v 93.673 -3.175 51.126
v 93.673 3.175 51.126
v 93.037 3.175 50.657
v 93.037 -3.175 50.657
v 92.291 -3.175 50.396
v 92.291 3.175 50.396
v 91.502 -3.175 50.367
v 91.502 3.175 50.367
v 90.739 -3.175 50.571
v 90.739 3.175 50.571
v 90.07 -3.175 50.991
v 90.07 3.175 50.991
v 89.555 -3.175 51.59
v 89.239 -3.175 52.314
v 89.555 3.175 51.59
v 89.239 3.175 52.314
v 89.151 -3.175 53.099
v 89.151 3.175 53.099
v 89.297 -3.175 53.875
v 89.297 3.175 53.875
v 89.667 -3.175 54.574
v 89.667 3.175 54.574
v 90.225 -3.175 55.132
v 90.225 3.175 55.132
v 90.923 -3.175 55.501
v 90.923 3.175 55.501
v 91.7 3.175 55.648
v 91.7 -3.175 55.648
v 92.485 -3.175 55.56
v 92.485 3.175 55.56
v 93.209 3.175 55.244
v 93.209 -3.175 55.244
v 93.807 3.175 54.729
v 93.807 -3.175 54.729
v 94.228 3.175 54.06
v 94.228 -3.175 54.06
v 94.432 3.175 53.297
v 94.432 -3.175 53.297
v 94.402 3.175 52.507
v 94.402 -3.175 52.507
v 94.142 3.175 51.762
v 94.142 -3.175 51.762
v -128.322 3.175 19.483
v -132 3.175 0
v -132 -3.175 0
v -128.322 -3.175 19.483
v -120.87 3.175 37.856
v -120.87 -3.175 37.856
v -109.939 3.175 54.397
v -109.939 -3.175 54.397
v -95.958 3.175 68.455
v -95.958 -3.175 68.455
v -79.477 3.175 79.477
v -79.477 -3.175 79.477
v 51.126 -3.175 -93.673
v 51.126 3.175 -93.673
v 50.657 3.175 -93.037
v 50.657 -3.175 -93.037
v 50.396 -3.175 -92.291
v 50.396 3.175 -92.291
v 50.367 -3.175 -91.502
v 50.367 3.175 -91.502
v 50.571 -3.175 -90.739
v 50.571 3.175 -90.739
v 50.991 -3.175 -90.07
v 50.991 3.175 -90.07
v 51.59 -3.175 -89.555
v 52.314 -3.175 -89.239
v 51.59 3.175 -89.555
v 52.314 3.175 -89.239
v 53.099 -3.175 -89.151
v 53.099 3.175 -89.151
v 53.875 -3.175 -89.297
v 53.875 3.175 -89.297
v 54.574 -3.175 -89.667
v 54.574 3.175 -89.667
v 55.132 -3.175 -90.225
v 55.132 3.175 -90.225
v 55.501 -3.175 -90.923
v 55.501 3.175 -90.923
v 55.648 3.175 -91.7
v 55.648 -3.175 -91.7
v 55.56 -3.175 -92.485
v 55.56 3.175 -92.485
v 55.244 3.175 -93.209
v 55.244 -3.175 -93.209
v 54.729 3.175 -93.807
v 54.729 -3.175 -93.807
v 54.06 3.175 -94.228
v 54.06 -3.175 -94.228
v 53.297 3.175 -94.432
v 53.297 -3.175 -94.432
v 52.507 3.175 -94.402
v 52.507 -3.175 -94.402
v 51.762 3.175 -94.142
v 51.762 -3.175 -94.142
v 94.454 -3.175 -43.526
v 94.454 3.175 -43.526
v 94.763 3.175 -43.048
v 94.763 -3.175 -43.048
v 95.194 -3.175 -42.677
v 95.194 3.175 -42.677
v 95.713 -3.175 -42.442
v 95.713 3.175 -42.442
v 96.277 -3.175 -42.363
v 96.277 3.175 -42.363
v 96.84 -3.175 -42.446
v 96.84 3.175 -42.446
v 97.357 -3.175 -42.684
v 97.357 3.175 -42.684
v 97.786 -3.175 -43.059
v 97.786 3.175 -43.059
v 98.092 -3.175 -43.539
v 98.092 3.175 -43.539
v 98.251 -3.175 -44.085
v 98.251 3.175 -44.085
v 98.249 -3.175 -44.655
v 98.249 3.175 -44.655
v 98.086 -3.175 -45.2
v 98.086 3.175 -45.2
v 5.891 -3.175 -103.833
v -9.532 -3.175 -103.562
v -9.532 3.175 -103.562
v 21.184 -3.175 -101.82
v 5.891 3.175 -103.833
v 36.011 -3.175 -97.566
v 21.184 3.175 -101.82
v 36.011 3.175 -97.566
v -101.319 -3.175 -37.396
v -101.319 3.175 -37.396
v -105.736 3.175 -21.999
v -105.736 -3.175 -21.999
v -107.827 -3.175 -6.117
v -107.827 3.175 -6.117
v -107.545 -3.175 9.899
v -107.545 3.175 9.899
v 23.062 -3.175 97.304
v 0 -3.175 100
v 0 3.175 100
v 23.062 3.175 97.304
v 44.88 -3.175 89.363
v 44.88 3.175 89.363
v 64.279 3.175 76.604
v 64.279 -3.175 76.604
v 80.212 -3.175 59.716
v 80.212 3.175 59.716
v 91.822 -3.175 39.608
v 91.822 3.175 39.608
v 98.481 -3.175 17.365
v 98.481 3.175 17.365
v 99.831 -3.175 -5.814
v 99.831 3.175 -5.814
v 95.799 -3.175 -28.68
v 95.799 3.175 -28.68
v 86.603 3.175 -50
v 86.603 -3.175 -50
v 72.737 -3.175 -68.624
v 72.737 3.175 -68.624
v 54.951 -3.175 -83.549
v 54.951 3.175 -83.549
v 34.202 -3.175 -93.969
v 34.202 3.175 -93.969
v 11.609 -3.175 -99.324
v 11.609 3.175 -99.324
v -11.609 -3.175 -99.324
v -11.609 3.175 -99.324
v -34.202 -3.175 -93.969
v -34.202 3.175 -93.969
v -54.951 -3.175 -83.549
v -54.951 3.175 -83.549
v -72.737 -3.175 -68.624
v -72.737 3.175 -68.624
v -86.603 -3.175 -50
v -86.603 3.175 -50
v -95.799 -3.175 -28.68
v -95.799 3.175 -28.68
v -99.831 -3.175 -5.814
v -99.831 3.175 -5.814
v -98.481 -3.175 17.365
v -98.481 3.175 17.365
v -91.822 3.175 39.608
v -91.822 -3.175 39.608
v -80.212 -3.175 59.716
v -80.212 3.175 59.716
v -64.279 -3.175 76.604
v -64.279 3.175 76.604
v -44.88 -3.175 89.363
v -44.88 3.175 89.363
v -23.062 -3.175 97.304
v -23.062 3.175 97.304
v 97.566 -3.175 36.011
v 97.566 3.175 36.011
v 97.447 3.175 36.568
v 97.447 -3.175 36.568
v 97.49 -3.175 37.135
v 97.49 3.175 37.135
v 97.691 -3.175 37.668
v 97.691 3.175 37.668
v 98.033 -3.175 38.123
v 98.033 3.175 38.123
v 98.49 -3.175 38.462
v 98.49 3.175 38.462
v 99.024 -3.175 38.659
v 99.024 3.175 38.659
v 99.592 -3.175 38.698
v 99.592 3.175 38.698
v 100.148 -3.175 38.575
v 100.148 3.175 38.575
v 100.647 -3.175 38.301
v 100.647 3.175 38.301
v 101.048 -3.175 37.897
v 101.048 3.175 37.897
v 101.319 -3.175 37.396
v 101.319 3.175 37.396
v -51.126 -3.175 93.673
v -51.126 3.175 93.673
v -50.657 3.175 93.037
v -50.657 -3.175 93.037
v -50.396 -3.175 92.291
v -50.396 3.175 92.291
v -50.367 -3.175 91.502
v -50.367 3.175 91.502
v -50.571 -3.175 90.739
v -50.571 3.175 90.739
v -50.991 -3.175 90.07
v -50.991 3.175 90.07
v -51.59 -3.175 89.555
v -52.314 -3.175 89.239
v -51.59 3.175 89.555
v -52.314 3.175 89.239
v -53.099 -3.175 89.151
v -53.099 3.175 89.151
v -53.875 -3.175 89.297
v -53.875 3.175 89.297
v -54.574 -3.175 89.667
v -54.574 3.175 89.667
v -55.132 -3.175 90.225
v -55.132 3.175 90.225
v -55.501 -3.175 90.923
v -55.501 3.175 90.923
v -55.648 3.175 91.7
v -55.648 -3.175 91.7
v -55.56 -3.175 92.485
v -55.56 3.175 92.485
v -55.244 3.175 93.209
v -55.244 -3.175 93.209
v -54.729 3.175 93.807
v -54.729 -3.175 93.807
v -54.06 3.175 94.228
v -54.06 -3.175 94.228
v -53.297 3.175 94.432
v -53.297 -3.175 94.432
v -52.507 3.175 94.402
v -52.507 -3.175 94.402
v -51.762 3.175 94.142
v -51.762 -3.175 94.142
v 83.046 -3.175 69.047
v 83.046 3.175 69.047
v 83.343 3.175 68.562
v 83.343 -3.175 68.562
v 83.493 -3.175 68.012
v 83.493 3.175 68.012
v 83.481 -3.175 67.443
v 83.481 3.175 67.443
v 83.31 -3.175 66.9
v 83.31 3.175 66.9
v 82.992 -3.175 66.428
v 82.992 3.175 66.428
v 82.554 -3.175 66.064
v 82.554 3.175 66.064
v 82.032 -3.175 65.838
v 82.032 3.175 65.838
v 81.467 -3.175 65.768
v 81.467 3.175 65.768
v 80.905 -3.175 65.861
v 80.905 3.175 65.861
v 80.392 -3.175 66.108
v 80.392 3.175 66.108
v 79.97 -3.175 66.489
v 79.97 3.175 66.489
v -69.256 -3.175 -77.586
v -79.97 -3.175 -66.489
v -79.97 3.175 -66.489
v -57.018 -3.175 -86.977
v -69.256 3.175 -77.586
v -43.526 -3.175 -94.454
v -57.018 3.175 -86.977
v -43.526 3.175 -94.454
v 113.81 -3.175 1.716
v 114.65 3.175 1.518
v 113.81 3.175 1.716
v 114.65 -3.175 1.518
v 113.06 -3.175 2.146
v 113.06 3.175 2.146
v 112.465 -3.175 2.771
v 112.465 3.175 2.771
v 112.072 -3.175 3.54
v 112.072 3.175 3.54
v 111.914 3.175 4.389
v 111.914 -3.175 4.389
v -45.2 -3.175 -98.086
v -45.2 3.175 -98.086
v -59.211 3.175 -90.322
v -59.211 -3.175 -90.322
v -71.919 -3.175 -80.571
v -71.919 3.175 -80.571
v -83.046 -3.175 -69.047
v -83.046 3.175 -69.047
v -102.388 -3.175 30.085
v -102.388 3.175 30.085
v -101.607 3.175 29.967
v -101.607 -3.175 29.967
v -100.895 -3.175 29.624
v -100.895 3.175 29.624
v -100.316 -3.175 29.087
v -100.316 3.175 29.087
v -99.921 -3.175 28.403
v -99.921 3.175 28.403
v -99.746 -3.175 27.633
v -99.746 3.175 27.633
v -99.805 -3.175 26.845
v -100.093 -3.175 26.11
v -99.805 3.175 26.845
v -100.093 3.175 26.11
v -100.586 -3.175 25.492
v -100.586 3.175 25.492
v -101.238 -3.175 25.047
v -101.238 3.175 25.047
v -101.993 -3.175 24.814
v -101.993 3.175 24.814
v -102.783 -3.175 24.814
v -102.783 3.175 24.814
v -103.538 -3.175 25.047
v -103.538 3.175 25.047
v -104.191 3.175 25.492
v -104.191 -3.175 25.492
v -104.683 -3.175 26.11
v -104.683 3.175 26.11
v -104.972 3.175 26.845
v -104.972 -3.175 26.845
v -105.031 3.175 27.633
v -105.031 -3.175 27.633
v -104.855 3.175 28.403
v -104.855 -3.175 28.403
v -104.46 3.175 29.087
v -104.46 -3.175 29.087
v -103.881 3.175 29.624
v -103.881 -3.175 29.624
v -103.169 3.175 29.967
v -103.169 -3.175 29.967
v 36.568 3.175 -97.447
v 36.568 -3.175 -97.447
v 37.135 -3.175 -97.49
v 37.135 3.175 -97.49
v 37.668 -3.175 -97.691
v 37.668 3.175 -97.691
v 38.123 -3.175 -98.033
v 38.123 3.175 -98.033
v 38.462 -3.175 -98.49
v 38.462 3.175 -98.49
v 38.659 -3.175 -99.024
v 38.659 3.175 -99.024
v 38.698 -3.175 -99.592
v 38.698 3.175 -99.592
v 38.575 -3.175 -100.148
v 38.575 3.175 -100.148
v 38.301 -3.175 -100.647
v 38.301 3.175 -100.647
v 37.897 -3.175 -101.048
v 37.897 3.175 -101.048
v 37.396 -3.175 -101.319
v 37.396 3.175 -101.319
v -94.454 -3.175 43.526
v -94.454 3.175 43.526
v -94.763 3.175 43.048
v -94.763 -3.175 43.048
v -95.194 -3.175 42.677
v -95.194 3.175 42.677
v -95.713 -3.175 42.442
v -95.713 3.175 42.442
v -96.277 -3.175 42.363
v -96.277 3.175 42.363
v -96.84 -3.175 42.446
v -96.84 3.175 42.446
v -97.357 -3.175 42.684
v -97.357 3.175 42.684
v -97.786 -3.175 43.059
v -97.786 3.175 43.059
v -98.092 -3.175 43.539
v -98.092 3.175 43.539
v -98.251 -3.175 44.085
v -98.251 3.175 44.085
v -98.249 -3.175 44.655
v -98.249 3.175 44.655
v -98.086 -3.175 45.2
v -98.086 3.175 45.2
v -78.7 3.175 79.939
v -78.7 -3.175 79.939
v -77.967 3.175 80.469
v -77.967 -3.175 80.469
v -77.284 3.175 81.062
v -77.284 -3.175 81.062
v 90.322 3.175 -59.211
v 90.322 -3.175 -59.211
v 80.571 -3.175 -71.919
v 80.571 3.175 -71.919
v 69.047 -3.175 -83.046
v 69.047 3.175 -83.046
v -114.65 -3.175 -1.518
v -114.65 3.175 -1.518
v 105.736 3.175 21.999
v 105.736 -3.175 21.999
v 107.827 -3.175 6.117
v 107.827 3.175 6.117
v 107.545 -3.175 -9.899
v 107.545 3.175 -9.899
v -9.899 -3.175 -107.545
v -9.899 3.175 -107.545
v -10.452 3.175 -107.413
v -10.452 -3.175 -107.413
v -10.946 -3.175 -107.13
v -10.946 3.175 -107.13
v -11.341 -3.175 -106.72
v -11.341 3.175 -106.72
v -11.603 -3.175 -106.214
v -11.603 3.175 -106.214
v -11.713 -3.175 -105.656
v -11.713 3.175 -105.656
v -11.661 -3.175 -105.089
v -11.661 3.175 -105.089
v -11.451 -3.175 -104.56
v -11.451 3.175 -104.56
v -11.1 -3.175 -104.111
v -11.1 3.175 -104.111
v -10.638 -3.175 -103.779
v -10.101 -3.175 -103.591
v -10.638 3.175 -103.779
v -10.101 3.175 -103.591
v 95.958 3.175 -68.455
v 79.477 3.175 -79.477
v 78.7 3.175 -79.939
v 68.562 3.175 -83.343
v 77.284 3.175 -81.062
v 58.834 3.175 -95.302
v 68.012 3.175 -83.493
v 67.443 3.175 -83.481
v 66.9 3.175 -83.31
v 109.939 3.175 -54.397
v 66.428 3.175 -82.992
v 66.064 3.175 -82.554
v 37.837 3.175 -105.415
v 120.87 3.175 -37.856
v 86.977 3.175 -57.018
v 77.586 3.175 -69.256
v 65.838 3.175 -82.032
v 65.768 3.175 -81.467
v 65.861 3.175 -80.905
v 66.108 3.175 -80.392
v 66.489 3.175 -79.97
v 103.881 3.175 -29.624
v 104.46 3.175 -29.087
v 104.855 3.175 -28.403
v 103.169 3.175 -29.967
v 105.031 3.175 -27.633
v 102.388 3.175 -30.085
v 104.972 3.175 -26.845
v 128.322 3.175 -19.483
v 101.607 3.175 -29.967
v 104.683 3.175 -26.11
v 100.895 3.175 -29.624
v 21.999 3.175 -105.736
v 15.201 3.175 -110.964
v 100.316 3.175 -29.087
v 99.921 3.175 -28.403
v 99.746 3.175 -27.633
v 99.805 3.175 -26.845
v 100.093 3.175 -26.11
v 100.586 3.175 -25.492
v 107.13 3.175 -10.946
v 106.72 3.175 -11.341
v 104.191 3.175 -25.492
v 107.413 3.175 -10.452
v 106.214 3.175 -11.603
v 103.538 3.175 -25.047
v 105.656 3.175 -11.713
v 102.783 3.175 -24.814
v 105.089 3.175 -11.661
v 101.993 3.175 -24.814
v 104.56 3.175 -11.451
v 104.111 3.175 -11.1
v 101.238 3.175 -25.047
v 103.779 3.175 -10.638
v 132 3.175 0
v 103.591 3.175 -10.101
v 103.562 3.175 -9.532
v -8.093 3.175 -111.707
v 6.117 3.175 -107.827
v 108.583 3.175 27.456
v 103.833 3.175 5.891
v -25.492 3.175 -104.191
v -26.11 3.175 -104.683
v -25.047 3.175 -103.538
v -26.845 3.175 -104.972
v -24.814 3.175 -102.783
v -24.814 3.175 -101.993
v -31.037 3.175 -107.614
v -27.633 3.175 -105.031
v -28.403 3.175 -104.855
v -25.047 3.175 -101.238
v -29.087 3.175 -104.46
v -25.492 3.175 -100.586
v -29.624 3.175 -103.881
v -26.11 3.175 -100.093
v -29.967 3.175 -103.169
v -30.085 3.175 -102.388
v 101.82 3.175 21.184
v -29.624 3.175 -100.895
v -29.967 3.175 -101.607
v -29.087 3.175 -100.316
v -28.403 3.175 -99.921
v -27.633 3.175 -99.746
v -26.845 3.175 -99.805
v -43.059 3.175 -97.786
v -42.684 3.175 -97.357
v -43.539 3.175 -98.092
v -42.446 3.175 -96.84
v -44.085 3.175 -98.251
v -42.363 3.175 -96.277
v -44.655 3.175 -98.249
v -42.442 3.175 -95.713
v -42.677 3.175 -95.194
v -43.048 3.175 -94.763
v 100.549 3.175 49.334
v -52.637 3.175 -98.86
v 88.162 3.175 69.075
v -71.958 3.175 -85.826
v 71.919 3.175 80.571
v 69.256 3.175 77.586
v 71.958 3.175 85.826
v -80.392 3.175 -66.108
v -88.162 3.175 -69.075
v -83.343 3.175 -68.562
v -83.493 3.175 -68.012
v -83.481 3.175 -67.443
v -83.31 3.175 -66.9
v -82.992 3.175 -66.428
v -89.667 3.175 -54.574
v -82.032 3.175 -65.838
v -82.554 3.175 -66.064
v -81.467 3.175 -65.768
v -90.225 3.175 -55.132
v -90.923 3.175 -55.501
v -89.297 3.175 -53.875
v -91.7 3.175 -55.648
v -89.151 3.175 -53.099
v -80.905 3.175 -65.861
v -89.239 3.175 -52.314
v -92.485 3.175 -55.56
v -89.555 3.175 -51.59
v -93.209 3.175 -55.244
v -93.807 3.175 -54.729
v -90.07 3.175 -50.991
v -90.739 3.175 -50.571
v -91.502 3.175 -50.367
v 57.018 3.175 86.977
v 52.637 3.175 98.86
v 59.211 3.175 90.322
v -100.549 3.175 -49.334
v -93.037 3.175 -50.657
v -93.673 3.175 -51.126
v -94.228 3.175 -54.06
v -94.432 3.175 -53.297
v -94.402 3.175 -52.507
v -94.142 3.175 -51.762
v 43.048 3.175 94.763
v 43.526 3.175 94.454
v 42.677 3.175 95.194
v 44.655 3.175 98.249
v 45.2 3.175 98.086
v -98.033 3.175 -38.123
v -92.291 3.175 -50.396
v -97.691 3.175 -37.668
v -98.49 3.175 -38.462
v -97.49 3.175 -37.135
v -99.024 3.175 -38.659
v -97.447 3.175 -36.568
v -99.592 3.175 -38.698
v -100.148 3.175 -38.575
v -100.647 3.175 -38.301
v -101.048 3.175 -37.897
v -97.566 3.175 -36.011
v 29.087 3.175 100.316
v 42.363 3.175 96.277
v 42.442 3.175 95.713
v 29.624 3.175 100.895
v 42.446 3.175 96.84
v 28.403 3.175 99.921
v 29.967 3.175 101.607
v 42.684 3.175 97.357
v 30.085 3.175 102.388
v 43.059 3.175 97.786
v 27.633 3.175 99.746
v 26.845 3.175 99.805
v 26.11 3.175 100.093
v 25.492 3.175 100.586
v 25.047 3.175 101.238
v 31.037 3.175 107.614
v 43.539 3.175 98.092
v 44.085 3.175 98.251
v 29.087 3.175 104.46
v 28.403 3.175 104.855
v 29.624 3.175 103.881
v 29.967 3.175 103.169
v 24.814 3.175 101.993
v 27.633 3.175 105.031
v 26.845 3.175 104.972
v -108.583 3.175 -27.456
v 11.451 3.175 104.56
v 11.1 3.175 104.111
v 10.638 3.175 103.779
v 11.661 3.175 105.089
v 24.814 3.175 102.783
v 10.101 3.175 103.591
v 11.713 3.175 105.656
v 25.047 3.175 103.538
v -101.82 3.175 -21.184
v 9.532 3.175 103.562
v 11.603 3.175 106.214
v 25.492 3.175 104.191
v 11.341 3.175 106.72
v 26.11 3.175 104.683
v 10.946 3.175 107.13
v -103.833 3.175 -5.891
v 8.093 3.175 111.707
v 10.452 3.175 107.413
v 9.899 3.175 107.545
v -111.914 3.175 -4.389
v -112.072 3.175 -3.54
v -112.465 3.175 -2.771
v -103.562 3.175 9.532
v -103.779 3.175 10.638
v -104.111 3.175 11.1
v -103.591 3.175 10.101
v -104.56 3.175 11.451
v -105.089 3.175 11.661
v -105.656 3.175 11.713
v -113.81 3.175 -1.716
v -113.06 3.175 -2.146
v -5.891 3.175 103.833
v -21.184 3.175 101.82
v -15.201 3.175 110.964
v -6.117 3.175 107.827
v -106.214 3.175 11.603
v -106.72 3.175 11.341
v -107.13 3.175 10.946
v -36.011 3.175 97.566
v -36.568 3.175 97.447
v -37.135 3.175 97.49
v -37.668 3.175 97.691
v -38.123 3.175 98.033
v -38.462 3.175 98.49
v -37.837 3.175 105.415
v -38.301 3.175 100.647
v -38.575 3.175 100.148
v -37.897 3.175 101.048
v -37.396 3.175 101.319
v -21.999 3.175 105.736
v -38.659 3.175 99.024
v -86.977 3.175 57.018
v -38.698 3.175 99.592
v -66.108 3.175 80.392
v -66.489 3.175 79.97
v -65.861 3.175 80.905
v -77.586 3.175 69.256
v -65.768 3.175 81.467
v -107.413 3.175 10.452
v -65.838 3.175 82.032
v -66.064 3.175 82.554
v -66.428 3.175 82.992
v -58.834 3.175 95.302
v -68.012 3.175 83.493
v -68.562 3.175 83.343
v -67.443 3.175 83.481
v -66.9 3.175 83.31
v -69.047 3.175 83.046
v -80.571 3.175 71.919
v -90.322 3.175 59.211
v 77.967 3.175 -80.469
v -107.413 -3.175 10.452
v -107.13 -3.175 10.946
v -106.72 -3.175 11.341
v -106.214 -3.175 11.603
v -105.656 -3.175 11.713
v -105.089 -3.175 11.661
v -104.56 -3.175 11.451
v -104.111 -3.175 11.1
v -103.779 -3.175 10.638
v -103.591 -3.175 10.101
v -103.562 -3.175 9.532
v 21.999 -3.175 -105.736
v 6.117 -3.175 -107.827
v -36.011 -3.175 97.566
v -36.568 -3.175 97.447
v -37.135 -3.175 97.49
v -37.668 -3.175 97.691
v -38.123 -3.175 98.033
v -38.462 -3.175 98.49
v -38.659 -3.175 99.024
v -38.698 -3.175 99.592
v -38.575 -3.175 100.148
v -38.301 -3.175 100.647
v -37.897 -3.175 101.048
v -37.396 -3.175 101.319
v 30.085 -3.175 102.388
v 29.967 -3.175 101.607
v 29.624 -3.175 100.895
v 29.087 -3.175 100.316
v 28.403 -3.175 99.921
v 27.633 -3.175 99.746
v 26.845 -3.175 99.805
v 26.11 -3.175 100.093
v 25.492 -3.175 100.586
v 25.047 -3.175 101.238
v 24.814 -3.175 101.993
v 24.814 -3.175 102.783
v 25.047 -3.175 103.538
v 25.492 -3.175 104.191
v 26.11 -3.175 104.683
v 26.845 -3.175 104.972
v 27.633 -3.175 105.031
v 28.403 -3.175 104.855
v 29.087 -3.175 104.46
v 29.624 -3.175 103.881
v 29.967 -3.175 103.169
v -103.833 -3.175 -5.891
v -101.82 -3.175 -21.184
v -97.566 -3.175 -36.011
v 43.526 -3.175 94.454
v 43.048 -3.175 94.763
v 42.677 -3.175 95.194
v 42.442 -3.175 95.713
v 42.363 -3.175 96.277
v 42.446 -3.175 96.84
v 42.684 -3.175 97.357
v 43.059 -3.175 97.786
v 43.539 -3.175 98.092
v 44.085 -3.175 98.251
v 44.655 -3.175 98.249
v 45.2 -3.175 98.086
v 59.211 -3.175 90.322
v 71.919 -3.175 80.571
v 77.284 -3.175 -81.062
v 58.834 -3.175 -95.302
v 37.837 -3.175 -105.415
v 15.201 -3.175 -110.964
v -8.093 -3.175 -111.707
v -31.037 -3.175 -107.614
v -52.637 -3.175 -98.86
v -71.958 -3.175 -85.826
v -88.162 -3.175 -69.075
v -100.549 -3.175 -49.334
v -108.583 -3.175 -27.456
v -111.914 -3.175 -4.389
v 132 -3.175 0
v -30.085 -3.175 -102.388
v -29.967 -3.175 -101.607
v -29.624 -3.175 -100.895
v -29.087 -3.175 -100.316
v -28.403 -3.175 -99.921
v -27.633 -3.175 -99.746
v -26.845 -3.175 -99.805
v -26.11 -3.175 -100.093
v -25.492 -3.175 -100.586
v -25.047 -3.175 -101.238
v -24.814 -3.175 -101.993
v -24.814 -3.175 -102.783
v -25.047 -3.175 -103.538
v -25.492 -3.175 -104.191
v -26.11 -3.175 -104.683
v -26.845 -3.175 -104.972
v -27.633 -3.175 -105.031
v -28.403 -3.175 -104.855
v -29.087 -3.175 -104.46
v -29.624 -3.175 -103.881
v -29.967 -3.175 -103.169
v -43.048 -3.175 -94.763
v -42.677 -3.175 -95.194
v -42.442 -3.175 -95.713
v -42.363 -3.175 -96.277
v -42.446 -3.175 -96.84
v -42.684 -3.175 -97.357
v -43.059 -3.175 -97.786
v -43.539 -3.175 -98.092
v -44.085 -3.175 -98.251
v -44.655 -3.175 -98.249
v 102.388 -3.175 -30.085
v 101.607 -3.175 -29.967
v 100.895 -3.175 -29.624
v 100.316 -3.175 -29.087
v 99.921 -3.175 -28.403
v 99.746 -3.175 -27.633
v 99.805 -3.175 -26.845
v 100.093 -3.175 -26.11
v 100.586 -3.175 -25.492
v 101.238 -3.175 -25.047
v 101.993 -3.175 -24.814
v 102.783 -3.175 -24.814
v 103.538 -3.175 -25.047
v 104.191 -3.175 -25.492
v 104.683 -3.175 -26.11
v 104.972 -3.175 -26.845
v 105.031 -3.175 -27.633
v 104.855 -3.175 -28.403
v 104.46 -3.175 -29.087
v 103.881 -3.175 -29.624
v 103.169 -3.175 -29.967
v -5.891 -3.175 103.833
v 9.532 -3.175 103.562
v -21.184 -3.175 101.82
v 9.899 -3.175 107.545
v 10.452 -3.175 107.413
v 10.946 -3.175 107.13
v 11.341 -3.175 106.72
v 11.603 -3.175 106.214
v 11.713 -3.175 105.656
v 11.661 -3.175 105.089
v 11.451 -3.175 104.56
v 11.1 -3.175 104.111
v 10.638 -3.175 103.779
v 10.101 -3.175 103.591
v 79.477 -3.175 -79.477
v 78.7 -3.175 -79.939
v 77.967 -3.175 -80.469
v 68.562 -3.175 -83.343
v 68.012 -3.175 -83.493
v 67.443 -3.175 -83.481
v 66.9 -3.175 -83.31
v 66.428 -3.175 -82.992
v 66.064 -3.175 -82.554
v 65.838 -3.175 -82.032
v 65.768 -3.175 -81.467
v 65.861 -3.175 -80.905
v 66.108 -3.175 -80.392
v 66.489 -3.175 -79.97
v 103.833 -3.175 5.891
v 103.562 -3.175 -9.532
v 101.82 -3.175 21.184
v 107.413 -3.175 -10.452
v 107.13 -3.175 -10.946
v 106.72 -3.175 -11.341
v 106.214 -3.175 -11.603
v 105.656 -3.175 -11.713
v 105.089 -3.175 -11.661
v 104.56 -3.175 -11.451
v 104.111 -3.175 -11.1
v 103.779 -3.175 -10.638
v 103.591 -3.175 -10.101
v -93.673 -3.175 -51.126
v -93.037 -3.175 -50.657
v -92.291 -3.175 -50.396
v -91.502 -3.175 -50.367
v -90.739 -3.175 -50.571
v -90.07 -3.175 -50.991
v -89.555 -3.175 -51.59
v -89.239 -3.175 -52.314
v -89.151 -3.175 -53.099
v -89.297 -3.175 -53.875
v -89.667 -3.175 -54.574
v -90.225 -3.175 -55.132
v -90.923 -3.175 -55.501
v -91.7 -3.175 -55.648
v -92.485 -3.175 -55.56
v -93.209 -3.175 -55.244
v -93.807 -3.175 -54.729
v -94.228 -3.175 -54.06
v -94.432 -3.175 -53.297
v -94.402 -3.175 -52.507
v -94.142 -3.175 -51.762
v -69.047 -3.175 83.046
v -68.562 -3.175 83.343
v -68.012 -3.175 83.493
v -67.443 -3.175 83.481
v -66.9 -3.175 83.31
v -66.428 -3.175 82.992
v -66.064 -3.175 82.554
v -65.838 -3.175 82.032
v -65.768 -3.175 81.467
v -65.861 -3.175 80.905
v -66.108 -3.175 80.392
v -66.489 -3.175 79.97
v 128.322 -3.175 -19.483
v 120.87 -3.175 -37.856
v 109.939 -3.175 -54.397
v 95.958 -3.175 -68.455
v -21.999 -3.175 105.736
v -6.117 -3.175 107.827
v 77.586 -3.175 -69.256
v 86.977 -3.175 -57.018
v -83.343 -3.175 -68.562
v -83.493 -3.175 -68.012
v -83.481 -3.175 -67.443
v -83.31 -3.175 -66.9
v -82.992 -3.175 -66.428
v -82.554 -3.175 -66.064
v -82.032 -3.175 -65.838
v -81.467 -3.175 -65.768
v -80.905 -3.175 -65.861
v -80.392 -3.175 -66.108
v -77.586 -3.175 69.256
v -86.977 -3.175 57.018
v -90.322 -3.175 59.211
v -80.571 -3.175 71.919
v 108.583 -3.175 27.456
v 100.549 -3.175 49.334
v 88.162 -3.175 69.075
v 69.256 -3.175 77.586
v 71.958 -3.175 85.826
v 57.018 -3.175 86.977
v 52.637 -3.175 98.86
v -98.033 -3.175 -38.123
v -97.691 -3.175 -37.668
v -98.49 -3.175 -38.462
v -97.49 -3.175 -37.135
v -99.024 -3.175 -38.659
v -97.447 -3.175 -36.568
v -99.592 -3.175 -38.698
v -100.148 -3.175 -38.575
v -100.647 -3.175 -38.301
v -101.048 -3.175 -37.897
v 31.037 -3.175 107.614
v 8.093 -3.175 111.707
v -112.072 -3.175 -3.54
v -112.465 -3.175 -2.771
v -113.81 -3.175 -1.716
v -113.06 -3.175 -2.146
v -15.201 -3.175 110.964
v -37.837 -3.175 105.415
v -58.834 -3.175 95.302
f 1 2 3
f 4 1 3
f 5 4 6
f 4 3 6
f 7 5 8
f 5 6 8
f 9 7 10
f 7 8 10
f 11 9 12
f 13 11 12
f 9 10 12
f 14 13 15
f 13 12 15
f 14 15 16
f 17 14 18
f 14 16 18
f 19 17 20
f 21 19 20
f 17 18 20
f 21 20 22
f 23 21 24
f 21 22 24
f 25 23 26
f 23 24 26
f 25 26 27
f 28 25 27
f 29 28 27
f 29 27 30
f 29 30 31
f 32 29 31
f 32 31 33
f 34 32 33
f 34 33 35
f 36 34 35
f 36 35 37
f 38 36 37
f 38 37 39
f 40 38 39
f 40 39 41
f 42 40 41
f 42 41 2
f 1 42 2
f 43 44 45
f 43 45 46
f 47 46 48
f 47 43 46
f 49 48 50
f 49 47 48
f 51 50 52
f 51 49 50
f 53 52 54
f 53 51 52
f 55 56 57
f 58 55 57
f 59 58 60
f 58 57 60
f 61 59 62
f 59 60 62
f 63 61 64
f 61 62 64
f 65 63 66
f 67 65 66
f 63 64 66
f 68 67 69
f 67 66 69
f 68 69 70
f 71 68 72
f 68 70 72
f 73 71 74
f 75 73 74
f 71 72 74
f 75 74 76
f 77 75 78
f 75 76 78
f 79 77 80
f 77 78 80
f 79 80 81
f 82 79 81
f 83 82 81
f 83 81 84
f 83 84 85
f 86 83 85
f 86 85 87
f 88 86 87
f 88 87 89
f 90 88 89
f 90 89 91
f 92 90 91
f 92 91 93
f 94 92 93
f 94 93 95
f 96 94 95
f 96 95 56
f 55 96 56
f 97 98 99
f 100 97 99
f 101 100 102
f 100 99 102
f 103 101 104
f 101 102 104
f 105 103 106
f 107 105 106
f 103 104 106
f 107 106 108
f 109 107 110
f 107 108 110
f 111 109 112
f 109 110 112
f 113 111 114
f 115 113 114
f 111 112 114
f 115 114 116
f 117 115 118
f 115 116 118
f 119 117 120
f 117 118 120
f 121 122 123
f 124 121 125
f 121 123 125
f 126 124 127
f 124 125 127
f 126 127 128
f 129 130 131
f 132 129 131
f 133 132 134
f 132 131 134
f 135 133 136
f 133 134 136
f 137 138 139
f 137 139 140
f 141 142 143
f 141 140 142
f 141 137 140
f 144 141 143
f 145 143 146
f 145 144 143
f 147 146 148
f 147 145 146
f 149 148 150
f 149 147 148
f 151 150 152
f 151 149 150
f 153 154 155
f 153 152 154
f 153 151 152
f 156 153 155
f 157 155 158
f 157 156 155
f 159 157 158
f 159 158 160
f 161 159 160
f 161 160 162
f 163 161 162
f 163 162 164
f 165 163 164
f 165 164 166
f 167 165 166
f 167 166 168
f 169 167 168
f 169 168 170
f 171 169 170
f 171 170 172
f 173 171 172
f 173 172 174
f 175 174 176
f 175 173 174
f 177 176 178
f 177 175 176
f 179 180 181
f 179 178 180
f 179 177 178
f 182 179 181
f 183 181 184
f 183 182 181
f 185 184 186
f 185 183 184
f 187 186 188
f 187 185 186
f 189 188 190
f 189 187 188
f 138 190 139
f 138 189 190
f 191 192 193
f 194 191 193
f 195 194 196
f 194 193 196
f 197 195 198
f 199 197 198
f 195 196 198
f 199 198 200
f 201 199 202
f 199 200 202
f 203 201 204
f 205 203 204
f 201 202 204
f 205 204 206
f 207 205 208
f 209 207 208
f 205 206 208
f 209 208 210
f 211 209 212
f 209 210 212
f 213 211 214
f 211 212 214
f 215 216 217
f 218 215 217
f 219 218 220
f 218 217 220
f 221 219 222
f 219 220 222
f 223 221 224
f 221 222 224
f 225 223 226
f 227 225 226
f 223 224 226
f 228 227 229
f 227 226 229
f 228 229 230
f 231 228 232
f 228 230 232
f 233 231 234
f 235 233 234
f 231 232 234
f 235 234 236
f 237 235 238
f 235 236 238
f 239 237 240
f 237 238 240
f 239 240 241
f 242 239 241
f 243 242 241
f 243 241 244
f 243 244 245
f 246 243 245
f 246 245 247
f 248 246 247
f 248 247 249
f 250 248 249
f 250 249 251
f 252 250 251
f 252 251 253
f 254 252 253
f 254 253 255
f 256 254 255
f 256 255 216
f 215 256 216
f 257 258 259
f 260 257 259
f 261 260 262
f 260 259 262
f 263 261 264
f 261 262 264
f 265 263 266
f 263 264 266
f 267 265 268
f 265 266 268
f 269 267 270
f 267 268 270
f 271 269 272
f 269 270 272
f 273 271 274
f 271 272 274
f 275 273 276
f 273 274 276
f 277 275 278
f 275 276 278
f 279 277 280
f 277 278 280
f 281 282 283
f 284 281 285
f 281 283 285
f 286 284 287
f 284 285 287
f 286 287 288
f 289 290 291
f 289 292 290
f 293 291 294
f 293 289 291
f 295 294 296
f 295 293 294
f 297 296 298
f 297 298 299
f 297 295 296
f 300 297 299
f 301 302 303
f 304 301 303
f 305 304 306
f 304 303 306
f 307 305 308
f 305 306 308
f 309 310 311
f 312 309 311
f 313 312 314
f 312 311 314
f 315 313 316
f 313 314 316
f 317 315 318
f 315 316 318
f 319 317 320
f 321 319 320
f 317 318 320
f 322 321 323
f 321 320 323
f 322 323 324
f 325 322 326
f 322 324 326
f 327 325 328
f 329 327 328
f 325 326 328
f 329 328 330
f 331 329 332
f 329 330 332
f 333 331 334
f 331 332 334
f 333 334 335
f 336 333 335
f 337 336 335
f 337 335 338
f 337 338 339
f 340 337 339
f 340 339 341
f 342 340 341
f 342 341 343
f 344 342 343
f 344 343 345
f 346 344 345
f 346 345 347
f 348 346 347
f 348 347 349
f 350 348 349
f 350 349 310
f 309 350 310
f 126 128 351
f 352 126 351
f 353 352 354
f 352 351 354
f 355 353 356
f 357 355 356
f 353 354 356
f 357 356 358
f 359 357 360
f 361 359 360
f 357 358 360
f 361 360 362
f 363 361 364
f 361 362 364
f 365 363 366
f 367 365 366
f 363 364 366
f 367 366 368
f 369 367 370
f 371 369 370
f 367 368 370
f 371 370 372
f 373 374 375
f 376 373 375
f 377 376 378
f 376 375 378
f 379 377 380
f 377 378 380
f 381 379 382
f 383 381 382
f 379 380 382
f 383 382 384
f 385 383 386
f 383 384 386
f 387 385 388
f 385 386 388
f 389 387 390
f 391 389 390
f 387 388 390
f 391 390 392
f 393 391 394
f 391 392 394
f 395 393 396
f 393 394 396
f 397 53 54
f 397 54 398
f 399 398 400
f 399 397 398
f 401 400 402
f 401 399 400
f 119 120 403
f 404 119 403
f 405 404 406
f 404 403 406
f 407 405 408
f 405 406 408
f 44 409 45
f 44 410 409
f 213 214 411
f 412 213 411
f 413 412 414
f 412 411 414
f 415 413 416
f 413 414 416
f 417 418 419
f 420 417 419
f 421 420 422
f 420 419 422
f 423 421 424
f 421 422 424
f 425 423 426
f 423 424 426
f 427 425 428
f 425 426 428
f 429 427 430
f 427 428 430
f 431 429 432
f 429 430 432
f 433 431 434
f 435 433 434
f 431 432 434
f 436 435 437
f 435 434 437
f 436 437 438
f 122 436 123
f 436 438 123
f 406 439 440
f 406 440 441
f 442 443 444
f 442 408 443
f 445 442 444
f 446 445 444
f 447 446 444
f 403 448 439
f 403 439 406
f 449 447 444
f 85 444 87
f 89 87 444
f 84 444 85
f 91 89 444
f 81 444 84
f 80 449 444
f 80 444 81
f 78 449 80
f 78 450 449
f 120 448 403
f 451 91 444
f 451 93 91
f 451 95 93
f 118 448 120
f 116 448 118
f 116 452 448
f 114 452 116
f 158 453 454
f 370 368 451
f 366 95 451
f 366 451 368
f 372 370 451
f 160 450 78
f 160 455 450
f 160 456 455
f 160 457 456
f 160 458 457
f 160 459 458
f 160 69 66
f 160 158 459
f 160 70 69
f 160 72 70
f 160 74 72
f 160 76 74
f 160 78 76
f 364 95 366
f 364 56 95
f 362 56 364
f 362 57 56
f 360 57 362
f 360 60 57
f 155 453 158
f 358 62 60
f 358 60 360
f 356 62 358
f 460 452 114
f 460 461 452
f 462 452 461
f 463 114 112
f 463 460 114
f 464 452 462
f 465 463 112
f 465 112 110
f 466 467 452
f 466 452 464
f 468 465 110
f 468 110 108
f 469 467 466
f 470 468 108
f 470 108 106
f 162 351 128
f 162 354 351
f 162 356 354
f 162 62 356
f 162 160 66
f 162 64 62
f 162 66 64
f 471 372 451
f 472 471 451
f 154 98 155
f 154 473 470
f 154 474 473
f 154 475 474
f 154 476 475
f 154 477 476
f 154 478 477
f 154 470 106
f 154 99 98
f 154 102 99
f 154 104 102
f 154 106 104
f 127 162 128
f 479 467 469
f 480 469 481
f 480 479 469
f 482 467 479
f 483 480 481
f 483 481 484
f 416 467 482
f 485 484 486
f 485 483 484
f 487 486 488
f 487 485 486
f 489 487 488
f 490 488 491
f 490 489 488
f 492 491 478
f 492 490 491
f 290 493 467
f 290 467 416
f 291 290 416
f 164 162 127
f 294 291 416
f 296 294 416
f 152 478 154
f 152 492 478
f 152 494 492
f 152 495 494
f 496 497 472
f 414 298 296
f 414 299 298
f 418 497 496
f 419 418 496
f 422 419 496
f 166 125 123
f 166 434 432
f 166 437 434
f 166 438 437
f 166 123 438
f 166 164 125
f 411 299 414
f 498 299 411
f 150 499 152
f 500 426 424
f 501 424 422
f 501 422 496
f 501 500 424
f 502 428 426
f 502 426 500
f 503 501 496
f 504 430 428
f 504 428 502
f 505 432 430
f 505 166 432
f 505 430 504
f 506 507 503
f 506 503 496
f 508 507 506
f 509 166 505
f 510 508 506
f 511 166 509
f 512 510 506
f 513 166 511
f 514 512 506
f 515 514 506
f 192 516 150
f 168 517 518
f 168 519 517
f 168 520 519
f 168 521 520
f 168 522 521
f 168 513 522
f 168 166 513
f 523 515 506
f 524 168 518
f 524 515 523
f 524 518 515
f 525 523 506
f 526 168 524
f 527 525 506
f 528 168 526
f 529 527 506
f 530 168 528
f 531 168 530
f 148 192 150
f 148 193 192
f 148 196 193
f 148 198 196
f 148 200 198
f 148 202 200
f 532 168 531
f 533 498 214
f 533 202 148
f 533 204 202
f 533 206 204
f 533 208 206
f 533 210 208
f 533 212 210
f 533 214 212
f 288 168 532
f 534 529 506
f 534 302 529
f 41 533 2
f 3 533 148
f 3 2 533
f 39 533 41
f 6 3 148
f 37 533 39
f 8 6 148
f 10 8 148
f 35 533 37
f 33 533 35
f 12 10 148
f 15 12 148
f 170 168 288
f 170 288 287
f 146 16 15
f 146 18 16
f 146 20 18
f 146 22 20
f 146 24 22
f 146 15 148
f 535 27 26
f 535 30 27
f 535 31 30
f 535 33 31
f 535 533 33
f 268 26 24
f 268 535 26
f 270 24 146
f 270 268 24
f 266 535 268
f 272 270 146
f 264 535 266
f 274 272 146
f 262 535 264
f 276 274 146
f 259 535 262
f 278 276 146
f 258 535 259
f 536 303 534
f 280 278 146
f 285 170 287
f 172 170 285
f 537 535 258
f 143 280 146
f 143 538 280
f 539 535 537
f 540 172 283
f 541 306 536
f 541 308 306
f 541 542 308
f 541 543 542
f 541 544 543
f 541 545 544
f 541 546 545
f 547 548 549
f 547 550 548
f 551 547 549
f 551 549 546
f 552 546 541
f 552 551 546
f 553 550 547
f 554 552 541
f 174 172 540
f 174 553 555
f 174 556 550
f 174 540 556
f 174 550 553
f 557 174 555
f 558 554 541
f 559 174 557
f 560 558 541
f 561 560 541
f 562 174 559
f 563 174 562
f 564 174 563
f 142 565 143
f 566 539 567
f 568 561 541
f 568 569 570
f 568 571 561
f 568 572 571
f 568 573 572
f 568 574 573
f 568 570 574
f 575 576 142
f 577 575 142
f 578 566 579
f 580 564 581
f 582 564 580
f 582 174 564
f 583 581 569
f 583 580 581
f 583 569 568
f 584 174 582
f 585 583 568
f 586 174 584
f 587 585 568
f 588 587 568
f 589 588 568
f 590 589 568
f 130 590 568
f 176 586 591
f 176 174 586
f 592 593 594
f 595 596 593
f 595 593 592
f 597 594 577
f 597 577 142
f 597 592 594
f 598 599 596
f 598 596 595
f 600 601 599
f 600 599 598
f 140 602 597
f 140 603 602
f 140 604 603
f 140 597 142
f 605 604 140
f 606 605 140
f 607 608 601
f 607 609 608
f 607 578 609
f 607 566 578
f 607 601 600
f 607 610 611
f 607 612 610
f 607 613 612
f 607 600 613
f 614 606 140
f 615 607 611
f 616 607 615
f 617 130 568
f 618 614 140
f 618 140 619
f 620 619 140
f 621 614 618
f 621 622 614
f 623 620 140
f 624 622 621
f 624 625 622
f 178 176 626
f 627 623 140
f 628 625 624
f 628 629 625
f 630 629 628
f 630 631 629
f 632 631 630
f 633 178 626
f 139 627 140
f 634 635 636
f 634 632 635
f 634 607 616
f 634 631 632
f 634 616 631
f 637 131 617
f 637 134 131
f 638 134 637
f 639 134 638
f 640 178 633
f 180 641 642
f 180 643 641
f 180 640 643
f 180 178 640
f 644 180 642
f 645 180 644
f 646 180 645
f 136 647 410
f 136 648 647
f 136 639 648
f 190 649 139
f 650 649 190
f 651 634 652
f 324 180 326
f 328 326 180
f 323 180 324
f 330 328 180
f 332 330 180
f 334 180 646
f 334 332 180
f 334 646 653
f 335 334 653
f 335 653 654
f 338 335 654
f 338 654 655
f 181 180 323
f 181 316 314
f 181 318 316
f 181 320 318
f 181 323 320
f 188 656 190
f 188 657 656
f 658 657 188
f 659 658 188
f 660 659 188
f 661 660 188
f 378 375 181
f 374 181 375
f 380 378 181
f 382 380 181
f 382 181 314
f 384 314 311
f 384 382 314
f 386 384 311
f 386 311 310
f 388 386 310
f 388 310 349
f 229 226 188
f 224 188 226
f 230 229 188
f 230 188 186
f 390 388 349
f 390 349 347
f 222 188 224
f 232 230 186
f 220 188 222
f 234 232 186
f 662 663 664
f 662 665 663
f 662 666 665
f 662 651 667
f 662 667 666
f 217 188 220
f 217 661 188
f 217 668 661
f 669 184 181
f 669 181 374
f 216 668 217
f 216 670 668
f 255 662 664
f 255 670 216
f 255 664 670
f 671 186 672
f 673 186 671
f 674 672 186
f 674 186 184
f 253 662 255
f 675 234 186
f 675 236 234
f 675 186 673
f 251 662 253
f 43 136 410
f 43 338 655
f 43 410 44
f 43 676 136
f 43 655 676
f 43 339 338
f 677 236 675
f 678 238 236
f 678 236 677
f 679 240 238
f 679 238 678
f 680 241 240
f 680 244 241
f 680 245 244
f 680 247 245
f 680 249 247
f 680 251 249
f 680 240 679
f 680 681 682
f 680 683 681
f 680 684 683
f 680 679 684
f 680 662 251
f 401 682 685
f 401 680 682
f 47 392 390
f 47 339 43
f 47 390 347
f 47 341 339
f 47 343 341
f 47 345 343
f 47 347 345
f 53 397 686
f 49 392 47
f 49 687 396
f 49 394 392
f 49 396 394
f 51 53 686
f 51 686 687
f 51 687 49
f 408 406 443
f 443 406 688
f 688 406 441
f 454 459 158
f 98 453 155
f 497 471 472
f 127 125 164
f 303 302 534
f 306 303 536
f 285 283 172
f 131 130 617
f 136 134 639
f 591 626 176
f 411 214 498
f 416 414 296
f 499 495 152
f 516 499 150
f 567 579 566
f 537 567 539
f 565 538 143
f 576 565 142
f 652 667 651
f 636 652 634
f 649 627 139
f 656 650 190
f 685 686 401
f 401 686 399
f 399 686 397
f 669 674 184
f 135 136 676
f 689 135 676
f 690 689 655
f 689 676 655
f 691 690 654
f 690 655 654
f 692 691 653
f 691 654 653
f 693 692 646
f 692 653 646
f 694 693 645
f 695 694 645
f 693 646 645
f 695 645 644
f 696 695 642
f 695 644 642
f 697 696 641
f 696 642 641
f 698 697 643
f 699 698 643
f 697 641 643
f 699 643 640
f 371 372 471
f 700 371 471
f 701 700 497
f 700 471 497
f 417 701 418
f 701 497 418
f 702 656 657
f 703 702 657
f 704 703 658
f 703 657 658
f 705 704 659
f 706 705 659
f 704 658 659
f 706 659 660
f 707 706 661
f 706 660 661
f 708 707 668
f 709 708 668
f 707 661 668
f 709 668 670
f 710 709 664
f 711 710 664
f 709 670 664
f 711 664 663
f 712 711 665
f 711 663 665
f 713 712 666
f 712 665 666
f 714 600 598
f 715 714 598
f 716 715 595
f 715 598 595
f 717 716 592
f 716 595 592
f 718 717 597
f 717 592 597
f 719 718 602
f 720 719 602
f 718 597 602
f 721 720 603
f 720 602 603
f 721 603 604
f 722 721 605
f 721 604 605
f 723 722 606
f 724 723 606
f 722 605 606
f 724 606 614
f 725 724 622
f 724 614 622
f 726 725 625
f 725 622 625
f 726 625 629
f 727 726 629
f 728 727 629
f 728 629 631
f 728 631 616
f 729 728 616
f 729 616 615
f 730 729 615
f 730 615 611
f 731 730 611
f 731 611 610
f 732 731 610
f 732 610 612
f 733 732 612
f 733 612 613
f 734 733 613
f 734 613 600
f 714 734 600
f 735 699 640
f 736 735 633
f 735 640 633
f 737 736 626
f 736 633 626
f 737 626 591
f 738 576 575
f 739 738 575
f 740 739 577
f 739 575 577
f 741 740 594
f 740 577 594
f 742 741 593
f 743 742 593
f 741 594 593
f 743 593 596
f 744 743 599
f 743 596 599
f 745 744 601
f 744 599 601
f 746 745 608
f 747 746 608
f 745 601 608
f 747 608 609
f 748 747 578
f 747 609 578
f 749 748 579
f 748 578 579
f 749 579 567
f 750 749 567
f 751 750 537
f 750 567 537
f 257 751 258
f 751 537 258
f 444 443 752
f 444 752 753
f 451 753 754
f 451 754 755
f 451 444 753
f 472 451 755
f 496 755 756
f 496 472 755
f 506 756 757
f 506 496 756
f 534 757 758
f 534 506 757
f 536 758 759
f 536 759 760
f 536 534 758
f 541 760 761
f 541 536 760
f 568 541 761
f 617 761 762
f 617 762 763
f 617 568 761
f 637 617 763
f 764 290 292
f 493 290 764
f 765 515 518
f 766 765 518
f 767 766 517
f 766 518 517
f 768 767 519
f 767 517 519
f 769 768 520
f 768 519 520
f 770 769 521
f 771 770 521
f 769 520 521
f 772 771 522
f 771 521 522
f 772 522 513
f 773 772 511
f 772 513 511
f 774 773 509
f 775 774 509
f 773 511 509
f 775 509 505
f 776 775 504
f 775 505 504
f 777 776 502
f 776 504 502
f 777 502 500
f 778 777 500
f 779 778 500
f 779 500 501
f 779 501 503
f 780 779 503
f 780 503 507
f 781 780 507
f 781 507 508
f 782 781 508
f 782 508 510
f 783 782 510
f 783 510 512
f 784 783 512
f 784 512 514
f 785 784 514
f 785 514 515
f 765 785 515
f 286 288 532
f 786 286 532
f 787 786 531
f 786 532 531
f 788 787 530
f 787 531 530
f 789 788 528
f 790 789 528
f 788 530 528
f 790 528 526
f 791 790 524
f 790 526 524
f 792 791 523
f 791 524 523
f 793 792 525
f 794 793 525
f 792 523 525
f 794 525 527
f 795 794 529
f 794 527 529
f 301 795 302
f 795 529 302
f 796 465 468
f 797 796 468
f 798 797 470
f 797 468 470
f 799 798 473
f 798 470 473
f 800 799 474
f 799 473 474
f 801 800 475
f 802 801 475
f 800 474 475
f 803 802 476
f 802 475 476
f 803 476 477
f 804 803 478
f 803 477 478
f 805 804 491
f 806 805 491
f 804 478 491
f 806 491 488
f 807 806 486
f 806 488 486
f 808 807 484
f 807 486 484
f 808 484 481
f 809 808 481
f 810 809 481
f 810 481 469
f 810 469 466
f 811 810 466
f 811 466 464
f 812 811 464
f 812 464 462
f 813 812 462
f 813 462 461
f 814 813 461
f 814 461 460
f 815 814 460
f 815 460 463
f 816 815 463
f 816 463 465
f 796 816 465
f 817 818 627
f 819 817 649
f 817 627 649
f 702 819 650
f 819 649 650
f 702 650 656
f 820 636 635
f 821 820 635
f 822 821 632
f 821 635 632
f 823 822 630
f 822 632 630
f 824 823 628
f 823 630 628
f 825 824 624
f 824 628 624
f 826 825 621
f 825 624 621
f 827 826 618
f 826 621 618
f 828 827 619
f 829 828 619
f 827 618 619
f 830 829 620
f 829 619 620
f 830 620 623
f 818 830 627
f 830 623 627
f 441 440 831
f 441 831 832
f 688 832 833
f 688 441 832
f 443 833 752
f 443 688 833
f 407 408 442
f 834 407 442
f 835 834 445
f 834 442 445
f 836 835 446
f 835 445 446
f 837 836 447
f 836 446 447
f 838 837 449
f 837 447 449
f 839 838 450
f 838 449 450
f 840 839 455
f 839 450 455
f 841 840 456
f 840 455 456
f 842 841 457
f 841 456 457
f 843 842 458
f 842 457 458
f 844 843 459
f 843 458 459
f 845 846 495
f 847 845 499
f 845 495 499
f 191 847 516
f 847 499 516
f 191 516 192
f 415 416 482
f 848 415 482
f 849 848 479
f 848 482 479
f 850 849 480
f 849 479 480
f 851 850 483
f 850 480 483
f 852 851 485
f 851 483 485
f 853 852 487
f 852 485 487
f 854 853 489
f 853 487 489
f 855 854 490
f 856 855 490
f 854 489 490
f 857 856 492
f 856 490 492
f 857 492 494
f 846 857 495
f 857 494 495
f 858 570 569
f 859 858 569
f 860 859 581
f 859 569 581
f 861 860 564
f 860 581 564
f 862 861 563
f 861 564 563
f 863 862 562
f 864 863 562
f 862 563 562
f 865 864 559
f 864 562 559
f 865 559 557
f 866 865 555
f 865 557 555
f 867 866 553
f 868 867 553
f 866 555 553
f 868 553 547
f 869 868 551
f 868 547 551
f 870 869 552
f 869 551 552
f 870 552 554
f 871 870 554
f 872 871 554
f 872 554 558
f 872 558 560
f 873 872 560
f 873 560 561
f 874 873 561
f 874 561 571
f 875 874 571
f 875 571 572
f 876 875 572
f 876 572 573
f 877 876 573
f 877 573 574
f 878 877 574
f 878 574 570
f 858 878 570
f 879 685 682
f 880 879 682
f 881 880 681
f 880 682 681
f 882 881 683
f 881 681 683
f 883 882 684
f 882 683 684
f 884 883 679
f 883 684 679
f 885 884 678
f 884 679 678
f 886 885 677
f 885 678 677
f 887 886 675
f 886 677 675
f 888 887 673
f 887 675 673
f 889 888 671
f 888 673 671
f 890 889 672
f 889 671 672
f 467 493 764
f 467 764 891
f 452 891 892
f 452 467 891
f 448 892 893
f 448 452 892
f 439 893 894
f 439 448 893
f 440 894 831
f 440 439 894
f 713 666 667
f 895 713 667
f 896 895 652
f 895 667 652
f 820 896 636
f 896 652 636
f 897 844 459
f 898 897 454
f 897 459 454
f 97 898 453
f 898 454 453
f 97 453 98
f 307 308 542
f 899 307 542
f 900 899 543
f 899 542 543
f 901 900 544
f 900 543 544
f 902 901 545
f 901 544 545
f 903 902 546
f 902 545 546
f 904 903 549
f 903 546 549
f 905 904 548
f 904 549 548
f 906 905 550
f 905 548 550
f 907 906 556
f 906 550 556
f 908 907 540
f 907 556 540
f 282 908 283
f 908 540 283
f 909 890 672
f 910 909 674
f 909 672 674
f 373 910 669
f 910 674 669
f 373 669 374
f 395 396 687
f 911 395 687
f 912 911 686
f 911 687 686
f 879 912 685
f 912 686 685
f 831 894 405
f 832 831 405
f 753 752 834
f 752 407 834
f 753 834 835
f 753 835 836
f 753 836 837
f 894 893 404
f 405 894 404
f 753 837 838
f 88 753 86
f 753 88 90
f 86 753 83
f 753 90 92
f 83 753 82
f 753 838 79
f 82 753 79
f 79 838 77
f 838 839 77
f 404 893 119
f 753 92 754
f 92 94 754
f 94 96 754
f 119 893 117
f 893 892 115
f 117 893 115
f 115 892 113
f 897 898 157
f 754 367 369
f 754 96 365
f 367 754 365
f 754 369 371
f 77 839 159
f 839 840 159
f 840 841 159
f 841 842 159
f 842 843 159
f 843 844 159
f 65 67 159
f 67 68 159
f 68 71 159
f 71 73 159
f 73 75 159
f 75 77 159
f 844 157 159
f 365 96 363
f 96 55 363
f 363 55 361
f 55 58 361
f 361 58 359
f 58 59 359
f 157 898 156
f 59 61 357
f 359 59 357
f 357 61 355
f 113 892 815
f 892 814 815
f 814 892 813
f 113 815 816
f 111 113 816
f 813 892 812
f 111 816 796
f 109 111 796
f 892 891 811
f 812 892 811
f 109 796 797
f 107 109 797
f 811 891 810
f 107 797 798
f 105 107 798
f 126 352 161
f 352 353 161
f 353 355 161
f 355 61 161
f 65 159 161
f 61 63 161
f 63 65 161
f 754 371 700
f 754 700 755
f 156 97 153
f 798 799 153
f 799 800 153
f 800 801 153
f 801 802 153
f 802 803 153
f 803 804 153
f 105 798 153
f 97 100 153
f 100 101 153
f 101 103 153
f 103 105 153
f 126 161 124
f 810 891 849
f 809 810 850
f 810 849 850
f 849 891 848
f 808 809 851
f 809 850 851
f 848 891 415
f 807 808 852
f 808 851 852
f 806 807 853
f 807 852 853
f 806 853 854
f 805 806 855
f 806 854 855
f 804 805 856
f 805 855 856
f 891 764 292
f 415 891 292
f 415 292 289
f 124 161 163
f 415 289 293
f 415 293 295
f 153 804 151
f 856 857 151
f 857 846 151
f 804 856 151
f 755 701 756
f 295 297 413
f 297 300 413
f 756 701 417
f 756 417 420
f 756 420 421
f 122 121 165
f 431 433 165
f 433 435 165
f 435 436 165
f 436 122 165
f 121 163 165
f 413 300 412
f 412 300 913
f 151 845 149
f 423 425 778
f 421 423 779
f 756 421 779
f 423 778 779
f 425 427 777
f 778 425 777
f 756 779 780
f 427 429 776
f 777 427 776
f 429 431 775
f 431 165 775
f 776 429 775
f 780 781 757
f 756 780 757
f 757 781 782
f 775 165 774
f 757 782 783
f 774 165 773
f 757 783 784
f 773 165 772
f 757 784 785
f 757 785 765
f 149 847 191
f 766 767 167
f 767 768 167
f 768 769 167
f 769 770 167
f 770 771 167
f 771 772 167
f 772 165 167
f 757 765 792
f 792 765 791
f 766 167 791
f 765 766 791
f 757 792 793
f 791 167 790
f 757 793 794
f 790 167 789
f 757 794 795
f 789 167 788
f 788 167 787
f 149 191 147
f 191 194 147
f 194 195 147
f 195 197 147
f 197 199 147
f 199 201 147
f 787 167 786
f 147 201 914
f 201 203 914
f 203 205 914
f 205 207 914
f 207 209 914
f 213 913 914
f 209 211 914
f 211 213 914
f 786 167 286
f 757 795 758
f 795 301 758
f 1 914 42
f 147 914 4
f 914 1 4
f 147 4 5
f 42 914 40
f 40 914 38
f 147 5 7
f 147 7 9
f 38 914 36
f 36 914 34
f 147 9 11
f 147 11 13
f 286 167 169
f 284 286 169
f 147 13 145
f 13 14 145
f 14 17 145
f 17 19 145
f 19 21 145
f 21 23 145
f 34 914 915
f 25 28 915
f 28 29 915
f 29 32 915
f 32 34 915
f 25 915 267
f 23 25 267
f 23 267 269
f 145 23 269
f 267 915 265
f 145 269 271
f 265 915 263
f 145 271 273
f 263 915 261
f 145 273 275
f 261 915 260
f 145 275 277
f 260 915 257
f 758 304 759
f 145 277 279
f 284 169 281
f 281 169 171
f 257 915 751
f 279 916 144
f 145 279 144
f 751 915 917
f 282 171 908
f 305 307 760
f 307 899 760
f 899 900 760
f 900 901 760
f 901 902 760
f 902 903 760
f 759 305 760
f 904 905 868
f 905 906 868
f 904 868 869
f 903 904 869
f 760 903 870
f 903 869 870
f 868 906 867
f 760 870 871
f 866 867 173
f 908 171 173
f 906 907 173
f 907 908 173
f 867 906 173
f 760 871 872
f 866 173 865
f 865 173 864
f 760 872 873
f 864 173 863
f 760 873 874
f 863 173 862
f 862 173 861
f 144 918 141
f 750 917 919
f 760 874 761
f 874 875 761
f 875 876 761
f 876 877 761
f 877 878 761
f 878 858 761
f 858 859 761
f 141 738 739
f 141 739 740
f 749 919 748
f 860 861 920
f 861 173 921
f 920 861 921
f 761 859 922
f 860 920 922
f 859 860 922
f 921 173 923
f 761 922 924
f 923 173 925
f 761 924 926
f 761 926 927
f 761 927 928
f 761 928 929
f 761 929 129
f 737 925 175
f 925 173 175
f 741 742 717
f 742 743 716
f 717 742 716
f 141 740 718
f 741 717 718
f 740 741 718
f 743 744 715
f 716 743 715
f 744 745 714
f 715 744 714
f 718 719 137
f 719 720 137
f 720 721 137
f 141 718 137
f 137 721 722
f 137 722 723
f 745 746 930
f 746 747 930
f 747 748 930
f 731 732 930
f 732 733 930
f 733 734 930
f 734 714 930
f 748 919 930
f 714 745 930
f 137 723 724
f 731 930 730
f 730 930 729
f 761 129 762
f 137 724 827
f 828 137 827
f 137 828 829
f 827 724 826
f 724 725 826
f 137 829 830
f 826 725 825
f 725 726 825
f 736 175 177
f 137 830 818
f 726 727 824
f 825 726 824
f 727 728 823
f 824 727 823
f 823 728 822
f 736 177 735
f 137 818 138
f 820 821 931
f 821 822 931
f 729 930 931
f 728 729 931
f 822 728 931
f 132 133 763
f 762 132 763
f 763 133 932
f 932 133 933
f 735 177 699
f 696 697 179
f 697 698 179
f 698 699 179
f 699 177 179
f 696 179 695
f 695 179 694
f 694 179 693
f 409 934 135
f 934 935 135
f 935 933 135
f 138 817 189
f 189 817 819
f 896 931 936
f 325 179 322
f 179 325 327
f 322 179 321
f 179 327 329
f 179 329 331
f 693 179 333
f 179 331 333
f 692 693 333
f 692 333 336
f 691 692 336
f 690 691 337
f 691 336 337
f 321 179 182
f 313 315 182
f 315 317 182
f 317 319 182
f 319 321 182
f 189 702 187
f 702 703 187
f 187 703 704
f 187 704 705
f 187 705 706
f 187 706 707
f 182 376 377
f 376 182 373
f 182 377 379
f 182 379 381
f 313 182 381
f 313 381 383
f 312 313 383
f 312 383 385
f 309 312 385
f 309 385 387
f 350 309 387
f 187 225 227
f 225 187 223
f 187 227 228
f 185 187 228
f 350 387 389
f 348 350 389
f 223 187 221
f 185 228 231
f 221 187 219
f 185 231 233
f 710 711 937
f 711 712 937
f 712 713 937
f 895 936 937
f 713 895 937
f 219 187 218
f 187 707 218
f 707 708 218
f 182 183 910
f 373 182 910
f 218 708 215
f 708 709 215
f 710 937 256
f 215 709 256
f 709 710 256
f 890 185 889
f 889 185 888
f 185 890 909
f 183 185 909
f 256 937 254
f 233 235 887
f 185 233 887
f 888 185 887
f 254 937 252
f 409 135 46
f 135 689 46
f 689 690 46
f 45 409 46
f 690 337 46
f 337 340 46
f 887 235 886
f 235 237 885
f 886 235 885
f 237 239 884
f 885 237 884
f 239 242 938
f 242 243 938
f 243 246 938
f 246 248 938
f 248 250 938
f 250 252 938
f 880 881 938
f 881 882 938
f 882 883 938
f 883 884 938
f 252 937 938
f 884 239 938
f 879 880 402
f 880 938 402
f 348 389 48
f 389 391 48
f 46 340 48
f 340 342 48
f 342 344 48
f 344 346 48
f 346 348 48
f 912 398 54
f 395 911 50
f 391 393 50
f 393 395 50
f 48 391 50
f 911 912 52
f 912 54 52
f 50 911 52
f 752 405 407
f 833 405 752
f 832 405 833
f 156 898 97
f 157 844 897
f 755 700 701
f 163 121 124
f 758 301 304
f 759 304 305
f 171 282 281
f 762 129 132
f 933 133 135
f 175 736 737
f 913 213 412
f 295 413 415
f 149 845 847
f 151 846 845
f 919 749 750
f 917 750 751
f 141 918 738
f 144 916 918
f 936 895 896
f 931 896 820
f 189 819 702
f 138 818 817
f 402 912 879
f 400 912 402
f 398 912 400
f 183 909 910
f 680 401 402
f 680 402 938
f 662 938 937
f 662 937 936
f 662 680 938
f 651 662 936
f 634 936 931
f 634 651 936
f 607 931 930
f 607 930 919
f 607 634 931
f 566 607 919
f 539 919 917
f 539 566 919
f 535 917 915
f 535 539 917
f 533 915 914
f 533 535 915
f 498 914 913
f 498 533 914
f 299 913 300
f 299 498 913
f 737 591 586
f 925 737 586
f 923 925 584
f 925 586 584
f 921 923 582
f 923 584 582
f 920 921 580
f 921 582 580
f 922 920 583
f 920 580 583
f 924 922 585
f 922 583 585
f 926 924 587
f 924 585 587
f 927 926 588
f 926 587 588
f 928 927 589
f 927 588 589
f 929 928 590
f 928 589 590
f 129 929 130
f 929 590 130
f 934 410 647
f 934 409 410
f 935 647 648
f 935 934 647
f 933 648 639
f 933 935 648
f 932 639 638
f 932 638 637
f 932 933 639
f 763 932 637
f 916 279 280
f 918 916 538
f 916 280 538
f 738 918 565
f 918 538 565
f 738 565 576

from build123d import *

# Parameters (mm, degrees)
SKETCH1_R                = 100
BOSS_EXTRUDE1_DEPTH      = 3.175
FILLET1_R                = 3
CIRPATTERN1_COUNT        = 2
FILLET1_OF_CIRPATTERN1_R = 3
SKETCH2_R                = 2.65
CUT_EXTRUDE1_DEPTH       = 174.229104079
CIRPATTERN2_COUNT        = 8
LIGHTENING_CUT_DEPTH     = 174.229104079
LIGHTENING_PATTERN_COUNT = 8


with BuildPart() as part:
    # Sketch1 → Boss-Extrude1 (new, symmetric)
    with BuildSketch(Plane(origin=(0, 0, 0), x_dir=(1, 0, 0), z_dir=(0, 1, 0))):
        with BuildLine():
            Line((-111.986312116, 1.750970805), (-132, 0))
            ThreePointArc((-132, 0), (-115.815804966, -46.398149165), (-79.477414809, -79.477414809))
            ThreePointArc((-79.477414809, -79.477414809), (-78.32708198, -80.19539315), (-77.284459499, -81.062397694))
            ThreePointArc((-77.284459499, -81.062397694), (103.297481806, 43.285450818), (-111.986312116, 1.750970805))
        make_face()
        with Locations(Location((0, 0, 0), (0, 0, 270))):
            Circle(SKETCH1_R, mode=Mode.SUBTRACT)
    boss_extrude1 = extrude(amount=BOSS_EXTRUDE1_DEPTH, both=True)

    # Fillet1
    fillet1_edges = [part.edges().sort_by_distance(p)[0] for p in [
        (-111.986312116, 0, -1.750970805),
    ]]
    fillet(fillet1_edges, radius=FILLET1_R)

    # CirPattern1: Boss-Extrude1 ×2 about axis
    cirpattern1_axis = Axis((0, 0, 0), (0, 1, 0))
    for i in range(1, CIRPATTERN1_COUNT):
        add(boss_extrude1.rotate(cirpattern1_axis, i * 360 / CIRPATTERN1_COUNT))

    # Fillet1 of CirPattern1
    fillet1_of_cirpattern1_edges = [part.edges().sort_by_distance(p)[0] for p in [
        (111.986312116, 0, 1.750970805),
    ]]
    fillet(fillet1_of_cirpattern1_edges, radius=FILLET1_OF_CIRPATTERN1_R)

    # Sketch2 → Cut-Extrude1 (cut, through all)
    with BuildSketch(Plane(origin=(0, 3.175, 0), x_dir=(1, 0, 0), z_dir=(0, 1, 0))):
        with Locations(Location((-102.388137587, -27.434818781, 0), (0, 0, 270))):
            Circle(SKETCH2_R)
    cut_extrude1 = extrude(amount=-CUT_EXTRUDE1_DEPTH, mode=Mode.SUBTRACT)

    # CirPattern2: Cut-Extrude1 ×8 about axis
    cirpattern2_axis = Axis((0, 0, 0), (0, 1, 0))
    for i in range(1, CIRPATTERN2_COUNT):
        add(cut_extrude1.rotate(cirpattern2_axis, i * 360 / CIRPATTERN2_COUNT), mode=Mode.SUBTRACT)

    # Sketch3 → Lightening Cut (cut, through all)
    with BuildSketch(Plane(origin=(0, 3.175, 0), x_dir=(1, 0, 0), z_dir=(0, 1, 0))):
        with BuildLine():
            ThreePointArc((-101.318921825, 37.396204088), (-107.076045028, 14.09682876), (-107.545413115, -9.898692736))
            ThreePointArc((-107.545413115, -9.898692736), (-105.370522266, -11.706965335), (-103.562249667, -9.532074486))
            ThreePointArc((-103.562249667, -9.532074486), (-103.110265583, 13.574723991), (-97.566369165, 36.011159492))
            ThreePointArc((-97.566369165, 36.011159492), (-98.750123197, 38.57995812), (-101.318921825, 37.396204088))
        make_face()
    lightening_cut = extrude(amount=-LIGHTENING_CUT_DEPTH, mode=Mode.SUBTRACT)

    # Lightening Pattern: Lightening Cut ×8 about axis
    lightening_pattern_axis = Axis((0, 0, 0), (0, 1, 0))
    for i in range(1, LIGHTENING_PATTERN_COUNT):
        add(lightening_cut.rotate(lightening_pattern_axis, i * 360 / LIGHTENING_PATTERN_COUNT), mode=Mode.SUBTRACT)


solid = part.part
